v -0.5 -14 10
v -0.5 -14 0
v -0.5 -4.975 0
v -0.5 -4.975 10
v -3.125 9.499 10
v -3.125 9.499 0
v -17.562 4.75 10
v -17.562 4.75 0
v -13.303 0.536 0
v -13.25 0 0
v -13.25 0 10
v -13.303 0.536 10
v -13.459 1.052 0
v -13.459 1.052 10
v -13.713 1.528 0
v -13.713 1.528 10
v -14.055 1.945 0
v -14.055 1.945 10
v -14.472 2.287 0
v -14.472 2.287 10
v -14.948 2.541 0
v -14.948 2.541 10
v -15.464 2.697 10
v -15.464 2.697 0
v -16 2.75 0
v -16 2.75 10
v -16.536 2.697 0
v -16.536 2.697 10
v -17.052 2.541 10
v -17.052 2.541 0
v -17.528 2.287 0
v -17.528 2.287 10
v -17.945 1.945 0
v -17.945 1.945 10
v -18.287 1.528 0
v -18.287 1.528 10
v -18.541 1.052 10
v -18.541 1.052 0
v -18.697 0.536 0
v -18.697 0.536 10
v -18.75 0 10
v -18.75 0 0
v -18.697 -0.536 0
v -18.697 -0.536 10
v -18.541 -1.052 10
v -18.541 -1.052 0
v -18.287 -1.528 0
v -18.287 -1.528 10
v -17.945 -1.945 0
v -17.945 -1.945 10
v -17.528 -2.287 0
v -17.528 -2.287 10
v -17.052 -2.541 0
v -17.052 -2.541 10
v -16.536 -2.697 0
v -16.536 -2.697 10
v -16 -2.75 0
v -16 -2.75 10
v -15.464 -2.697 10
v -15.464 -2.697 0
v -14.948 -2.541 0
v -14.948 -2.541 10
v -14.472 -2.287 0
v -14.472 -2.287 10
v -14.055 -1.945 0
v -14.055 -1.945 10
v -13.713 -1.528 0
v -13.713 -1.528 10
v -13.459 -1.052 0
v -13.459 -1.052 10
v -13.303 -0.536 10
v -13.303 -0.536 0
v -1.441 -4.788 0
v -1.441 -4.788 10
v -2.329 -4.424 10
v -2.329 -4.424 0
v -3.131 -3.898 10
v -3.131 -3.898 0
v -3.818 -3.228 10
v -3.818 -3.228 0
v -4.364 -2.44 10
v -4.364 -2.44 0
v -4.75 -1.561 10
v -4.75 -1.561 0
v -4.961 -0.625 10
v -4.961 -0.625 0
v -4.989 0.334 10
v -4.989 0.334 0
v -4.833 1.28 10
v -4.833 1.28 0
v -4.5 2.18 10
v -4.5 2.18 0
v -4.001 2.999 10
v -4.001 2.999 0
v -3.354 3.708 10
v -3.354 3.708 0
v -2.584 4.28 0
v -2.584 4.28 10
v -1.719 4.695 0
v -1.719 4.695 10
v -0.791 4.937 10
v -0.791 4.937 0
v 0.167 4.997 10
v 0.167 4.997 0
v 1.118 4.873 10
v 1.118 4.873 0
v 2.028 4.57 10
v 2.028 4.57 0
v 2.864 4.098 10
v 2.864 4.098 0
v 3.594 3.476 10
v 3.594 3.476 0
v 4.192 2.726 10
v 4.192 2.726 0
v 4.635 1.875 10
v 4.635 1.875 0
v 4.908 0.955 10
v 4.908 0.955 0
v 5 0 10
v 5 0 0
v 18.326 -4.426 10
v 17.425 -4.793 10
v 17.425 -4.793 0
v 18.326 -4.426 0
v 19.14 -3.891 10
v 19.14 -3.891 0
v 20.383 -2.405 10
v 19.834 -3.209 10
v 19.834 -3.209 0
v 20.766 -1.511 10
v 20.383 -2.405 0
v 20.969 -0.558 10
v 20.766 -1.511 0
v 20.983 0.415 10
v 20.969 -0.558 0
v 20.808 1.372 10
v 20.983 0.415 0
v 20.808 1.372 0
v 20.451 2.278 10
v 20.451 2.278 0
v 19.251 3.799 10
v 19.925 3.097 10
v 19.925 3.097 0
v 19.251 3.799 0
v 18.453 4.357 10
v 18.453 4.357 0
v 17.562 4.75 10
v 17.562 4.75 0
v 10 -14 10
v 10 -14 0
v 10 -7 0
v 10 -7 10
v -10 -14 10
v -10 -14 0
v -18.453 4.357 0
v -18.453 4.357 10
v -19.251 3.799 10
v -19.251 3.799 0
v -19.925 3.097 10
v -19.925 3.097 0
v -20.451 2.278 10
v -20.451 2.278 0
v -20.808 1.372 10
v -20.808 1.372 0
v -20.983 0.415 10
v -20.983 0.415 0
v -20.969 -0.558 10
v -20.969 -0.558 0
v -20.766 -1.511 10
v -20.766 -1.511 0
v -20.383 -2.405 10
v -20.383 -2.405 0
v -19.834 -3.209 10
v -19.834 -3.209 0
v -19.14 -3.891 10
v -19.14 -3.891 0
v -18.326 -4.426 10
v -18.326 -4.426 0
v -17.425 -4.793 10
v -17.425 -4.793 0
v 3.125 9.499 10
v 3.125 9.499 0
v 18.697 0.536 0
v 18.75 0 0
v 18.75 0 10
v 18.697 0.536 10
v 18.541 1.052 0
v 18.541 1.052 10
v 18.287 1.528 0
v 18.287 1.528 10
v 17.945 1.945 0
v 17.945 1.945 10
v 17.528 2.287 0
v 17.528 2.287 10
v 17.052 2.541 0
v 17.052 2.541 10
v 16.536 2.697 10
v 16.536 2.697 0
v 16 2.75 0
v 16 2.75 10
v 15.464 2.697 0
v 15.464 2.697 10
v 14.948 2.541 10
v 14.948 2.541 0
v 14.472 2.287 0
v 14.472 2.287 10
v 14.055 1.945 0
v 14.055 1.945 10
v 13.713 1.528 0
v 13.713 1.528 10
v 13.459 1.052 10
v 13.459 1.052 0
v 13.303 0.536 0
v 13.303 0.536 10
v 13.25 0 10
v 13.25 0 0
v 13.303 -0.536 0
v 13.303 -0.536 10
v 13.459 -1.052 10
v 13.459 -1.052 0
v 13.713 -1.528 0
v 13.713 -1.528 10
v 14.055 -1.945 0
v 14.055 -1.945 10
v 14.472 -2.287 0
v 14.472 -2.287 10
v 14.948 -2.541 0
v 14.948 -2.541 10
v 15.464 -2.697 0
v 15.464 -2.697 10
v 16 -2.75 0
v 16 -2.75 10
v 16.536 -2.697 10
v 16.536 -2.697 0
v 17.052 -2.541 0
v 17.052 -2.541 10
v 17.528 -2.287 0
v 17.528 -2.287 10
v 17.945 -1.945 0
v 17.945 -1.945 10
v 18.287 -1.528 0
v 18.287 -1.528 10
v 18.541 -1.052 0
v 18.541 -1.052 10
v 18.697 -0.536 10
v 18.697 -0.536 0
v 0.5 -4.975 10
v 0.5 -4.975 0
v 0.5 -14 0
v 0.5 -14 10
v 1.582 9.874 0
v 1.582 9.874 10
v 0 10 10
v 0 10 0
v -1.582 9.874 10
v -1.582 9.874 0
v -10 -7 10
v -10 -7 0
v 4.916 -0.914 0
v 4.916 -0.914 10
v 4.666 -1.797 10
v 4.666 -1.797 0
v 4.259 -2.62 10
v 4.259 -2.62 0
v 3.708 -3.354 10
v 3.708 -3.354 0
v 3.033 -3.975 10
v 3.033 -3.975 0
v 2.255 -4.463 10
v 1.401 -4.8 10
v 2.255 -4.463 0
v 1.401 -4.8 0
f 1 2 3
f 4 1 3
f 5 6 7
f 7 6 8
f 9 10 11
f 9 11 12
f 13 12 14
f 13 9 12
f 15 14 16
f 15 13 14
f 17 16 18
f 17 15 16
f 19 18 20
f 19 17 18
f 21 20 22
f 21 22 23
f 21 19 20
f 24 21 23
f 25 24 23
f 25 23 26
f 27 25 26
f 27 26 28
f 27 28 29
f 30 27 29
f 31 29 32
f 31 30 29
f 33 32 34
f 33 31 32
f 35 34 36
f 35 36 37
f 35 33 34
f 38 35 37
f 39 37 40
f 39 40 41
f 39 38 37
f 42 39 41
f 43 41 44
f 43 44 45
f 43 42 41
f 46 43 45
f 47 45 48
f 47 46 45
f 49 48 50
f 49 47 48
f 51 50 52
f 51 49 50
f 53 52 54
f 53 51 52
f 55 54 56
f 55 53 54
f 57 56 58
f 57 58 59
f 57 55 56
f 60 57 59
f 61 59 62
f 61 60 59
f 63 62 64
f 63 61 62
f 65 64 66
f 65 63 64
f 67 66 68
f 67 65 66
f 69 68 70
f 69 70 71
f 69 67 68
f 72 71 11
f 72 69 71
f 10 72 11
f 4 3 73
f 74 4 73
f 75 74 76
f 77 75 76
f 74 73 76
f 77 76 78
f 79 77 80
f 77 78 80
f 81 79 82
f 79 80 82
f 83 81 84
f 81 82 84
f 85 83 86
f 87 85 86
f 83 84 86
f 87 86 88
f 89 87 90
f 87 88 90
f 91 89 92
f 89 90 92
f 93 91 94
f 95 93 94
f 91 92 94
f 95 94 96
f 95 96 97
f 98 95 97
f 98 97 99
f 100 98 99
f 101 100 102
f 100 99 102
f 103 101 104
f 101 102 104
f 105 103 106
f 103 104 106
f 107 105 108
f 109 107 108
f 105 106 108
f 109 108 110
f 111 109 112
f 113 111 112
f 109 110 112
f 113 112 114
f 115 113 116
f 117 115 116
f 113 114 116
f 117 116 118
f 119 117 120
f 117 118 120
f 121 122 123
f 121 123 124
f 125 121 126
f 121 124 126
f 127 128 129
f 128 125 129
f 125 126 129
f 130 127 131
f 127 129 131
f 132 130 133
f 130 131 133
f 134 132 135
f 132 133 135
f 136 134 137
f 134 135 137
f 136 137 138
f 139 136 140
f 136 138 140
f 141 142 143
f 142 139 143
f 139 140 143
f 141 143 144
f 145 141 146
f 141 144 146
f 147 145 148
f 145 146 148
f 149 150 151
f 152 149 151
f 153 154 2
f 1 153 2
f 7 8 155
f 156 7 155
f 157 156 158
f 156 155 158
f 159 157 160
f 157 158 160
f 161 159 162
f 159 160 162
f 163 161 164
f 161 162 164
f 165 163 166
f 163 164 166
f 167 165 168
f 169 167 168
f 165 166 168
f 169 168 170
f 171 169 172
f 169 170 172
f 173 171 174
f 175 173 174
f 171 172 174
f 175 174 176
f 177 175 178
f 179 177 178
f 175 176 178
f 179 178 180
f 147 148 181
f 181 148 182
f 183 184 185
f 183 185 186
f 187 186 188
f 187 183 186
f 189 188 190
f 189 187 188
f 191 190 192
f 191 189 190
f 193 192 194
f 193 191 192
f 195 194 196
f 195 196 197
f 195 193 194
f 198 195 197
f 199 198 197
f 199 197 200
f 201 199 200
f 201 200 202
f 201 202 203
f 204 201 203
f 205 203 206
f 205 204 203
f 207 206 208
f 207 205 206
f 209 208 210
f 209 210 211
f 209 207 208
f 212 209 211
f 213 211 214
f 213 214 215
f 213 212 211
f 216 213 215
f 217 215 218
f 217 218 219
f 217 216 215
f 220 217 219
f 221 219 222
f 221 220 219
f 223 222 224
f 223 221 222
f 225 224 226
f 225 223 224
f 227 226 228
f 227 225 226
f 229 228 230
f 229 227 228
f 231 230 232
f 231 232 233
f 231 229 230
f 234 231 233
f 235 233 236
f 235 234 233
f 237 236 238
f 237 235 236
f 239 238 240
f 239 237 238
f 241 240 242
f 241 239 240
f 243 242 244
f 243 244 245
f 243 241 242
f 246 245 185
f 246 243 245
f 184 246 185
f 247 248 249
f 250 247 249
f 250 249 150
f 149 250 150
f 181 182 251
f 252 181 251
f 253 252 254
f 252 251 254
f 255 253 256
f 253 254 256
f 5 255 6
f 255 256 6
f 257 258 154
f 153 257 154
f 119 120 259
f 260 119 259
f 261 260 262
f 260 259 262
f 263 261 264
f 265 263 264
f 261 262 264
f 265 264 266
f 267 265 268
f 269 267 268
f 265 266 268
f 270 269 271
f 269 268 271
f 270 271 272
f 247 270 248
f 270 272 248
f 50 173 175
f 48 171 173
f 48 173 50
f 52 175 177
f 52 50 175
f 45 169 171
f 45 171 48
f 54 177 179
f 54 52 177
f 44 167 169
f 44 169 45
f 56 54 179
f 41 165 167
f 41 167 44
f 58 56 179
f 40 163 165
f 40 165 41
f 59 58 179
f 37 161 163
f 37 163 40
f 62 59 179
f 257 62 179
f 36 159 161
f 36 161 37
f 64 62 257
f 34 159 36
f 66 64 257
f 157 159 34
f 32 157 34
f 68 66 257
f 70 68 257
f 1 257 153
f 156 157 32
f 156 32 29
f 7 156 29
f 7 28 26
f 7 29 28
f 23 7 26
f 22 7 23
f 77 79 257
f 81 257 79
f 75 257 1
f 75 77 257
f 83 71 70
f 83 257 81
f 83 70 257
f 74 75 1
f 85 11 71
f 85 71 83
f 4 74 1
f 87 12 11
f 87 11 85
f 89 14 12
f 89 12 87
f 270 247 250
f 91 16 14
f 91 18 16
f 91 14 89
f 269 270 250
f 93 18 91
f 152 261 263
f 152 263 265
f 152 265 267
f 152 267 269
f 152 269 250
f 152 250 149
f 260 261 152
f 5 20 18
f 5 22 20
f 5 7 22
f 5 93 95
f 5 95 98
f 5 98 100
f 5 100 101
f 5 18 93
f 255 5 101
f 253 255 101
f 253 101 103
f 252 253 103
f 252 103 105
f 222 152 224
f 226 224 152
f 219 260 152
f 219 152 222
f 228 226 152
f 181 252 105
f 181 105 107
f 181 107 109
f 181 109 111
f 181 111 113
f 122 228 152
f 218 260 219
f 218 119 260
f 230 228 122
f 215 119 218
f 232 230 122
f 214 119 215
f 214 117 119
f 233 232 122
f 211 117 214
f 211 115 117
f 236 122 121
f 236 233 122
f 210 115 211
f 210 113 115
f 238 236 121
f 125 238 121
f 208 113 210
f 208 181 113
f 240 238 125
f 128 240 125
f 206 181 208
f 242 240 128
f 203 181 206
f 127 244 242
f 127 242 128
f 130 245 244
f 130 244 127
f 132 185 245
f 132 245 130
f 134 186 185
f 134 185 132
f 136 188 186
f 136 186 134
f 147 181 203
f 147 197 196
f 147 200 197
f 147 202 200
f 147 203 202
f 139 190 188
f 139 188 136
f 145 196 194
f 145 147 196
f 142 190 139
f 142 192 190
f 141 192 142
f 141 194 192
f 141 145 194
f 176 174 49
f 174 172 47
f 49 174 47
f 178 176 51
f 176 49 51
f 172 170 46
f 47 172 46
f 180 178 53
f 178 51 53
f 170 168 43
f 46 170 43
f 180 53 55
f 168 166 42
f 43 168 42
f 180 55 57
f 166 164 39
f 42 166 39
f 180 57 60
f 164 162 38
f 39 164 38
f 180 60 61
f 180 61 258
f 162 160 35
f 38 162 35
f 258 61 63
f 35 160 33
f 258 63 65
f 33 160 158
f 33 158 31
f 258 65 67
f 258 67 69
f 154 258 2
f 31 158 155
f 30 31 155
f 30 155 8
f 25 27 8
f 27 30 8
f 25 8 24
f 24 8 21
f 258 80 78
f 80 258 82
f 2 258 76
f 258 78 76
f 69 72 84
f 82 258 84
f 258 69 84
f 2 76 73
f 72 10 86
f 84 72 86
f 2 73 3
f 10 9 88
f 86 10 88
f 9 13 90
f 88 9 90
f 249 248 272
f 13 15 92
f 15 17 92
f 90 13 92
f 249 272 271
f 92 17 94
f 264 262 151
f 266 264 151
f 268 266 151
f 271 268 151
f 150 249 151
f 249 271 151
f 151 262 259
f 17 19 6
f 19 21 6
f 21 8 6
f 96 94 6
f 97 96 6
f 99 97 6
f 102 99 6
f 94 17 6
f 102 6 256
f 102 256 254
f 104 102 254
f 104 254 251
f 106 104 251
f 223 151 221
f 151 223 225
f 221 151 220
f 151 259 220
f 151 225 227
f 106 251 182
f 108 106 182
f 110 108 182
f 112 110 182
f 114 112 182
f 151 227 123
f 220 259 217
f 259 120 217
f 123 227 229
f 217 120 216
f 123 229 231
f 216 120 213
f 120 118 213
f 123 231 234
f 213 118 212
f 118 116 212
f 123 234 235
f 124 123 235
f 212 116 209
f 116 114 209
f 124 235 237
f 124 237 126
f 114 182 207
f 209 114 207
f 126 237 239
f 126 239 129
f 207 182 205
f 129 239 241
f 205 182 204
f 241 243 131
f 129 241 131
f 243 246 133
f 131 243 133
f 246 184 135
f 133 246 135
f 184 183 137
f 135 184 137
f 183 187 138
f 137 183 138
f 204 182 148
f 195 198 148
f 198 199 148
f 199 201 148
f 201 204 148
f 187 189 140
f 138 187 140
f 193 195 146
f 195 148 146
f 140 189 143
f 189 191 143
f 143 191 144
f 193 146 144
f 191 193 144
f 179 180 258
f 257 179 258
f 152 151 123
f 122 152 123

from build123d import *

# Parameters (mm, degrees)
SKETCH_1_R      = 5
SKETCH_1_R_2    = 2.75
EXTRUDE_1_DEPTH = 10


with BuildPart() as part:
    # 草图1 → 凸台-拉伸1 (new body)
    # profile 1 of 5: a face of its own
    with BuildSketch(Plane.XY):
        with BuildLine():
            ThreePointArc((3.125, 9.499177596), (0, 10), (-3.125, 9.499177596))
            ThreePointArc((-3.125, 9.499177596), (-9.91048591, -1.335016492), (-0.5, -9.987492178))
            Line((-0.5, -9.987492178), (-0.5, -7.481214682))
            Line((-0.5, -7.481214682), (-0.5, -4.974937186))
            ThreePointArc((-0.5, -4.974937186), (-3.354101966, 3.708099244), (5, 0))
            ThreePointArc((5, 0), (3.708099244, -3.354101966), (0.5, -4.974937186))
            Line((0.5, -4.974937186), (0.5, -7.481214682))
            Line((0.5, -7.481214682), (0.5, -9.987492178))
            ThreePointArc((0.5, -9.987492178), (7.245688373, -6.892024376), (10, 0))
            ThreePointArc((10, 0), (8.100925873, 5.8630197), (3.125, 9.499177596))
        make_face()
    # profile 2 of 5: a face of its own
    with BuildSketch(Plane.XY):
        with BuildLine():
            Line((-3.125, 9.499177596), (-17.5625, 4.749588798))
            ThreePointArc((-17.5625, 4.749588798), (-13.06849015, 4.050462937), (-11, 0))
            ThreePointArc((-11, 0), (-13.010355295, -4.007745568), (-17.424809815, -4.792694127))
            Line((-17.424809815, -4.792694127), (-10, -7))
            Line((-10, -7), (-10, -14))
            Line((-10, -14), (-0.5, -14))
            Line((-0.5, -14), (-0.5, -9.987492178))
            ThreePointArc((-0.5, -9.987492178), (-9.91048591, -1.335016492), (-3.125, 9.499177596))
        make_face()
    # profile 3 of 5: a face of its own
    with BuildSketch(Plane.XY):
        with Locations((-16, 0)):
            Circle(SKETCH_1_R)
        with Locations((-16, 0)):
            Circle(SKETCH_1_R_2, mode=Mode.SUBTRACT)
    # profile 4 of 5: a face of its own
    with BuildSketch(Plane.XY):
        with BuildLine():
            Line((17.5625, 4.749588798), (3.125, 9.499177596))
            ThreePointArc((3.125, 9.499177596), (8.100925873, 5.8630197), (10, 0))
            ThreePointArc((10, 0), (7.245688373, -6.892024376), (0.5, -9.987492178))
            Line((0.5, -9.987492178), (0.5, -14))
            Line((0.5, -14), (10, -14))
            Line((10, -14), (10, -7))
            Line((10, -7), (17.424809815, -4.792694127))
            ThreePointArc((17.424809815, -4.792694127), (11.000520443, 0.072139893), (17.5625, 4.749588798))
        make_face()
    # profile 5 of 5: a face of its own
    with BuildSketch(Plane.XY):
        with Locations((16, 0)):
            Circle(SKETCH_1_R)
        with Locations((16, 0)):
            Circle(SKETCH_1_R_2, mode=Mode.SUBTRACT)
    extrude(amount=EXTRUDE_1_DEPTH)


solid = part.part
